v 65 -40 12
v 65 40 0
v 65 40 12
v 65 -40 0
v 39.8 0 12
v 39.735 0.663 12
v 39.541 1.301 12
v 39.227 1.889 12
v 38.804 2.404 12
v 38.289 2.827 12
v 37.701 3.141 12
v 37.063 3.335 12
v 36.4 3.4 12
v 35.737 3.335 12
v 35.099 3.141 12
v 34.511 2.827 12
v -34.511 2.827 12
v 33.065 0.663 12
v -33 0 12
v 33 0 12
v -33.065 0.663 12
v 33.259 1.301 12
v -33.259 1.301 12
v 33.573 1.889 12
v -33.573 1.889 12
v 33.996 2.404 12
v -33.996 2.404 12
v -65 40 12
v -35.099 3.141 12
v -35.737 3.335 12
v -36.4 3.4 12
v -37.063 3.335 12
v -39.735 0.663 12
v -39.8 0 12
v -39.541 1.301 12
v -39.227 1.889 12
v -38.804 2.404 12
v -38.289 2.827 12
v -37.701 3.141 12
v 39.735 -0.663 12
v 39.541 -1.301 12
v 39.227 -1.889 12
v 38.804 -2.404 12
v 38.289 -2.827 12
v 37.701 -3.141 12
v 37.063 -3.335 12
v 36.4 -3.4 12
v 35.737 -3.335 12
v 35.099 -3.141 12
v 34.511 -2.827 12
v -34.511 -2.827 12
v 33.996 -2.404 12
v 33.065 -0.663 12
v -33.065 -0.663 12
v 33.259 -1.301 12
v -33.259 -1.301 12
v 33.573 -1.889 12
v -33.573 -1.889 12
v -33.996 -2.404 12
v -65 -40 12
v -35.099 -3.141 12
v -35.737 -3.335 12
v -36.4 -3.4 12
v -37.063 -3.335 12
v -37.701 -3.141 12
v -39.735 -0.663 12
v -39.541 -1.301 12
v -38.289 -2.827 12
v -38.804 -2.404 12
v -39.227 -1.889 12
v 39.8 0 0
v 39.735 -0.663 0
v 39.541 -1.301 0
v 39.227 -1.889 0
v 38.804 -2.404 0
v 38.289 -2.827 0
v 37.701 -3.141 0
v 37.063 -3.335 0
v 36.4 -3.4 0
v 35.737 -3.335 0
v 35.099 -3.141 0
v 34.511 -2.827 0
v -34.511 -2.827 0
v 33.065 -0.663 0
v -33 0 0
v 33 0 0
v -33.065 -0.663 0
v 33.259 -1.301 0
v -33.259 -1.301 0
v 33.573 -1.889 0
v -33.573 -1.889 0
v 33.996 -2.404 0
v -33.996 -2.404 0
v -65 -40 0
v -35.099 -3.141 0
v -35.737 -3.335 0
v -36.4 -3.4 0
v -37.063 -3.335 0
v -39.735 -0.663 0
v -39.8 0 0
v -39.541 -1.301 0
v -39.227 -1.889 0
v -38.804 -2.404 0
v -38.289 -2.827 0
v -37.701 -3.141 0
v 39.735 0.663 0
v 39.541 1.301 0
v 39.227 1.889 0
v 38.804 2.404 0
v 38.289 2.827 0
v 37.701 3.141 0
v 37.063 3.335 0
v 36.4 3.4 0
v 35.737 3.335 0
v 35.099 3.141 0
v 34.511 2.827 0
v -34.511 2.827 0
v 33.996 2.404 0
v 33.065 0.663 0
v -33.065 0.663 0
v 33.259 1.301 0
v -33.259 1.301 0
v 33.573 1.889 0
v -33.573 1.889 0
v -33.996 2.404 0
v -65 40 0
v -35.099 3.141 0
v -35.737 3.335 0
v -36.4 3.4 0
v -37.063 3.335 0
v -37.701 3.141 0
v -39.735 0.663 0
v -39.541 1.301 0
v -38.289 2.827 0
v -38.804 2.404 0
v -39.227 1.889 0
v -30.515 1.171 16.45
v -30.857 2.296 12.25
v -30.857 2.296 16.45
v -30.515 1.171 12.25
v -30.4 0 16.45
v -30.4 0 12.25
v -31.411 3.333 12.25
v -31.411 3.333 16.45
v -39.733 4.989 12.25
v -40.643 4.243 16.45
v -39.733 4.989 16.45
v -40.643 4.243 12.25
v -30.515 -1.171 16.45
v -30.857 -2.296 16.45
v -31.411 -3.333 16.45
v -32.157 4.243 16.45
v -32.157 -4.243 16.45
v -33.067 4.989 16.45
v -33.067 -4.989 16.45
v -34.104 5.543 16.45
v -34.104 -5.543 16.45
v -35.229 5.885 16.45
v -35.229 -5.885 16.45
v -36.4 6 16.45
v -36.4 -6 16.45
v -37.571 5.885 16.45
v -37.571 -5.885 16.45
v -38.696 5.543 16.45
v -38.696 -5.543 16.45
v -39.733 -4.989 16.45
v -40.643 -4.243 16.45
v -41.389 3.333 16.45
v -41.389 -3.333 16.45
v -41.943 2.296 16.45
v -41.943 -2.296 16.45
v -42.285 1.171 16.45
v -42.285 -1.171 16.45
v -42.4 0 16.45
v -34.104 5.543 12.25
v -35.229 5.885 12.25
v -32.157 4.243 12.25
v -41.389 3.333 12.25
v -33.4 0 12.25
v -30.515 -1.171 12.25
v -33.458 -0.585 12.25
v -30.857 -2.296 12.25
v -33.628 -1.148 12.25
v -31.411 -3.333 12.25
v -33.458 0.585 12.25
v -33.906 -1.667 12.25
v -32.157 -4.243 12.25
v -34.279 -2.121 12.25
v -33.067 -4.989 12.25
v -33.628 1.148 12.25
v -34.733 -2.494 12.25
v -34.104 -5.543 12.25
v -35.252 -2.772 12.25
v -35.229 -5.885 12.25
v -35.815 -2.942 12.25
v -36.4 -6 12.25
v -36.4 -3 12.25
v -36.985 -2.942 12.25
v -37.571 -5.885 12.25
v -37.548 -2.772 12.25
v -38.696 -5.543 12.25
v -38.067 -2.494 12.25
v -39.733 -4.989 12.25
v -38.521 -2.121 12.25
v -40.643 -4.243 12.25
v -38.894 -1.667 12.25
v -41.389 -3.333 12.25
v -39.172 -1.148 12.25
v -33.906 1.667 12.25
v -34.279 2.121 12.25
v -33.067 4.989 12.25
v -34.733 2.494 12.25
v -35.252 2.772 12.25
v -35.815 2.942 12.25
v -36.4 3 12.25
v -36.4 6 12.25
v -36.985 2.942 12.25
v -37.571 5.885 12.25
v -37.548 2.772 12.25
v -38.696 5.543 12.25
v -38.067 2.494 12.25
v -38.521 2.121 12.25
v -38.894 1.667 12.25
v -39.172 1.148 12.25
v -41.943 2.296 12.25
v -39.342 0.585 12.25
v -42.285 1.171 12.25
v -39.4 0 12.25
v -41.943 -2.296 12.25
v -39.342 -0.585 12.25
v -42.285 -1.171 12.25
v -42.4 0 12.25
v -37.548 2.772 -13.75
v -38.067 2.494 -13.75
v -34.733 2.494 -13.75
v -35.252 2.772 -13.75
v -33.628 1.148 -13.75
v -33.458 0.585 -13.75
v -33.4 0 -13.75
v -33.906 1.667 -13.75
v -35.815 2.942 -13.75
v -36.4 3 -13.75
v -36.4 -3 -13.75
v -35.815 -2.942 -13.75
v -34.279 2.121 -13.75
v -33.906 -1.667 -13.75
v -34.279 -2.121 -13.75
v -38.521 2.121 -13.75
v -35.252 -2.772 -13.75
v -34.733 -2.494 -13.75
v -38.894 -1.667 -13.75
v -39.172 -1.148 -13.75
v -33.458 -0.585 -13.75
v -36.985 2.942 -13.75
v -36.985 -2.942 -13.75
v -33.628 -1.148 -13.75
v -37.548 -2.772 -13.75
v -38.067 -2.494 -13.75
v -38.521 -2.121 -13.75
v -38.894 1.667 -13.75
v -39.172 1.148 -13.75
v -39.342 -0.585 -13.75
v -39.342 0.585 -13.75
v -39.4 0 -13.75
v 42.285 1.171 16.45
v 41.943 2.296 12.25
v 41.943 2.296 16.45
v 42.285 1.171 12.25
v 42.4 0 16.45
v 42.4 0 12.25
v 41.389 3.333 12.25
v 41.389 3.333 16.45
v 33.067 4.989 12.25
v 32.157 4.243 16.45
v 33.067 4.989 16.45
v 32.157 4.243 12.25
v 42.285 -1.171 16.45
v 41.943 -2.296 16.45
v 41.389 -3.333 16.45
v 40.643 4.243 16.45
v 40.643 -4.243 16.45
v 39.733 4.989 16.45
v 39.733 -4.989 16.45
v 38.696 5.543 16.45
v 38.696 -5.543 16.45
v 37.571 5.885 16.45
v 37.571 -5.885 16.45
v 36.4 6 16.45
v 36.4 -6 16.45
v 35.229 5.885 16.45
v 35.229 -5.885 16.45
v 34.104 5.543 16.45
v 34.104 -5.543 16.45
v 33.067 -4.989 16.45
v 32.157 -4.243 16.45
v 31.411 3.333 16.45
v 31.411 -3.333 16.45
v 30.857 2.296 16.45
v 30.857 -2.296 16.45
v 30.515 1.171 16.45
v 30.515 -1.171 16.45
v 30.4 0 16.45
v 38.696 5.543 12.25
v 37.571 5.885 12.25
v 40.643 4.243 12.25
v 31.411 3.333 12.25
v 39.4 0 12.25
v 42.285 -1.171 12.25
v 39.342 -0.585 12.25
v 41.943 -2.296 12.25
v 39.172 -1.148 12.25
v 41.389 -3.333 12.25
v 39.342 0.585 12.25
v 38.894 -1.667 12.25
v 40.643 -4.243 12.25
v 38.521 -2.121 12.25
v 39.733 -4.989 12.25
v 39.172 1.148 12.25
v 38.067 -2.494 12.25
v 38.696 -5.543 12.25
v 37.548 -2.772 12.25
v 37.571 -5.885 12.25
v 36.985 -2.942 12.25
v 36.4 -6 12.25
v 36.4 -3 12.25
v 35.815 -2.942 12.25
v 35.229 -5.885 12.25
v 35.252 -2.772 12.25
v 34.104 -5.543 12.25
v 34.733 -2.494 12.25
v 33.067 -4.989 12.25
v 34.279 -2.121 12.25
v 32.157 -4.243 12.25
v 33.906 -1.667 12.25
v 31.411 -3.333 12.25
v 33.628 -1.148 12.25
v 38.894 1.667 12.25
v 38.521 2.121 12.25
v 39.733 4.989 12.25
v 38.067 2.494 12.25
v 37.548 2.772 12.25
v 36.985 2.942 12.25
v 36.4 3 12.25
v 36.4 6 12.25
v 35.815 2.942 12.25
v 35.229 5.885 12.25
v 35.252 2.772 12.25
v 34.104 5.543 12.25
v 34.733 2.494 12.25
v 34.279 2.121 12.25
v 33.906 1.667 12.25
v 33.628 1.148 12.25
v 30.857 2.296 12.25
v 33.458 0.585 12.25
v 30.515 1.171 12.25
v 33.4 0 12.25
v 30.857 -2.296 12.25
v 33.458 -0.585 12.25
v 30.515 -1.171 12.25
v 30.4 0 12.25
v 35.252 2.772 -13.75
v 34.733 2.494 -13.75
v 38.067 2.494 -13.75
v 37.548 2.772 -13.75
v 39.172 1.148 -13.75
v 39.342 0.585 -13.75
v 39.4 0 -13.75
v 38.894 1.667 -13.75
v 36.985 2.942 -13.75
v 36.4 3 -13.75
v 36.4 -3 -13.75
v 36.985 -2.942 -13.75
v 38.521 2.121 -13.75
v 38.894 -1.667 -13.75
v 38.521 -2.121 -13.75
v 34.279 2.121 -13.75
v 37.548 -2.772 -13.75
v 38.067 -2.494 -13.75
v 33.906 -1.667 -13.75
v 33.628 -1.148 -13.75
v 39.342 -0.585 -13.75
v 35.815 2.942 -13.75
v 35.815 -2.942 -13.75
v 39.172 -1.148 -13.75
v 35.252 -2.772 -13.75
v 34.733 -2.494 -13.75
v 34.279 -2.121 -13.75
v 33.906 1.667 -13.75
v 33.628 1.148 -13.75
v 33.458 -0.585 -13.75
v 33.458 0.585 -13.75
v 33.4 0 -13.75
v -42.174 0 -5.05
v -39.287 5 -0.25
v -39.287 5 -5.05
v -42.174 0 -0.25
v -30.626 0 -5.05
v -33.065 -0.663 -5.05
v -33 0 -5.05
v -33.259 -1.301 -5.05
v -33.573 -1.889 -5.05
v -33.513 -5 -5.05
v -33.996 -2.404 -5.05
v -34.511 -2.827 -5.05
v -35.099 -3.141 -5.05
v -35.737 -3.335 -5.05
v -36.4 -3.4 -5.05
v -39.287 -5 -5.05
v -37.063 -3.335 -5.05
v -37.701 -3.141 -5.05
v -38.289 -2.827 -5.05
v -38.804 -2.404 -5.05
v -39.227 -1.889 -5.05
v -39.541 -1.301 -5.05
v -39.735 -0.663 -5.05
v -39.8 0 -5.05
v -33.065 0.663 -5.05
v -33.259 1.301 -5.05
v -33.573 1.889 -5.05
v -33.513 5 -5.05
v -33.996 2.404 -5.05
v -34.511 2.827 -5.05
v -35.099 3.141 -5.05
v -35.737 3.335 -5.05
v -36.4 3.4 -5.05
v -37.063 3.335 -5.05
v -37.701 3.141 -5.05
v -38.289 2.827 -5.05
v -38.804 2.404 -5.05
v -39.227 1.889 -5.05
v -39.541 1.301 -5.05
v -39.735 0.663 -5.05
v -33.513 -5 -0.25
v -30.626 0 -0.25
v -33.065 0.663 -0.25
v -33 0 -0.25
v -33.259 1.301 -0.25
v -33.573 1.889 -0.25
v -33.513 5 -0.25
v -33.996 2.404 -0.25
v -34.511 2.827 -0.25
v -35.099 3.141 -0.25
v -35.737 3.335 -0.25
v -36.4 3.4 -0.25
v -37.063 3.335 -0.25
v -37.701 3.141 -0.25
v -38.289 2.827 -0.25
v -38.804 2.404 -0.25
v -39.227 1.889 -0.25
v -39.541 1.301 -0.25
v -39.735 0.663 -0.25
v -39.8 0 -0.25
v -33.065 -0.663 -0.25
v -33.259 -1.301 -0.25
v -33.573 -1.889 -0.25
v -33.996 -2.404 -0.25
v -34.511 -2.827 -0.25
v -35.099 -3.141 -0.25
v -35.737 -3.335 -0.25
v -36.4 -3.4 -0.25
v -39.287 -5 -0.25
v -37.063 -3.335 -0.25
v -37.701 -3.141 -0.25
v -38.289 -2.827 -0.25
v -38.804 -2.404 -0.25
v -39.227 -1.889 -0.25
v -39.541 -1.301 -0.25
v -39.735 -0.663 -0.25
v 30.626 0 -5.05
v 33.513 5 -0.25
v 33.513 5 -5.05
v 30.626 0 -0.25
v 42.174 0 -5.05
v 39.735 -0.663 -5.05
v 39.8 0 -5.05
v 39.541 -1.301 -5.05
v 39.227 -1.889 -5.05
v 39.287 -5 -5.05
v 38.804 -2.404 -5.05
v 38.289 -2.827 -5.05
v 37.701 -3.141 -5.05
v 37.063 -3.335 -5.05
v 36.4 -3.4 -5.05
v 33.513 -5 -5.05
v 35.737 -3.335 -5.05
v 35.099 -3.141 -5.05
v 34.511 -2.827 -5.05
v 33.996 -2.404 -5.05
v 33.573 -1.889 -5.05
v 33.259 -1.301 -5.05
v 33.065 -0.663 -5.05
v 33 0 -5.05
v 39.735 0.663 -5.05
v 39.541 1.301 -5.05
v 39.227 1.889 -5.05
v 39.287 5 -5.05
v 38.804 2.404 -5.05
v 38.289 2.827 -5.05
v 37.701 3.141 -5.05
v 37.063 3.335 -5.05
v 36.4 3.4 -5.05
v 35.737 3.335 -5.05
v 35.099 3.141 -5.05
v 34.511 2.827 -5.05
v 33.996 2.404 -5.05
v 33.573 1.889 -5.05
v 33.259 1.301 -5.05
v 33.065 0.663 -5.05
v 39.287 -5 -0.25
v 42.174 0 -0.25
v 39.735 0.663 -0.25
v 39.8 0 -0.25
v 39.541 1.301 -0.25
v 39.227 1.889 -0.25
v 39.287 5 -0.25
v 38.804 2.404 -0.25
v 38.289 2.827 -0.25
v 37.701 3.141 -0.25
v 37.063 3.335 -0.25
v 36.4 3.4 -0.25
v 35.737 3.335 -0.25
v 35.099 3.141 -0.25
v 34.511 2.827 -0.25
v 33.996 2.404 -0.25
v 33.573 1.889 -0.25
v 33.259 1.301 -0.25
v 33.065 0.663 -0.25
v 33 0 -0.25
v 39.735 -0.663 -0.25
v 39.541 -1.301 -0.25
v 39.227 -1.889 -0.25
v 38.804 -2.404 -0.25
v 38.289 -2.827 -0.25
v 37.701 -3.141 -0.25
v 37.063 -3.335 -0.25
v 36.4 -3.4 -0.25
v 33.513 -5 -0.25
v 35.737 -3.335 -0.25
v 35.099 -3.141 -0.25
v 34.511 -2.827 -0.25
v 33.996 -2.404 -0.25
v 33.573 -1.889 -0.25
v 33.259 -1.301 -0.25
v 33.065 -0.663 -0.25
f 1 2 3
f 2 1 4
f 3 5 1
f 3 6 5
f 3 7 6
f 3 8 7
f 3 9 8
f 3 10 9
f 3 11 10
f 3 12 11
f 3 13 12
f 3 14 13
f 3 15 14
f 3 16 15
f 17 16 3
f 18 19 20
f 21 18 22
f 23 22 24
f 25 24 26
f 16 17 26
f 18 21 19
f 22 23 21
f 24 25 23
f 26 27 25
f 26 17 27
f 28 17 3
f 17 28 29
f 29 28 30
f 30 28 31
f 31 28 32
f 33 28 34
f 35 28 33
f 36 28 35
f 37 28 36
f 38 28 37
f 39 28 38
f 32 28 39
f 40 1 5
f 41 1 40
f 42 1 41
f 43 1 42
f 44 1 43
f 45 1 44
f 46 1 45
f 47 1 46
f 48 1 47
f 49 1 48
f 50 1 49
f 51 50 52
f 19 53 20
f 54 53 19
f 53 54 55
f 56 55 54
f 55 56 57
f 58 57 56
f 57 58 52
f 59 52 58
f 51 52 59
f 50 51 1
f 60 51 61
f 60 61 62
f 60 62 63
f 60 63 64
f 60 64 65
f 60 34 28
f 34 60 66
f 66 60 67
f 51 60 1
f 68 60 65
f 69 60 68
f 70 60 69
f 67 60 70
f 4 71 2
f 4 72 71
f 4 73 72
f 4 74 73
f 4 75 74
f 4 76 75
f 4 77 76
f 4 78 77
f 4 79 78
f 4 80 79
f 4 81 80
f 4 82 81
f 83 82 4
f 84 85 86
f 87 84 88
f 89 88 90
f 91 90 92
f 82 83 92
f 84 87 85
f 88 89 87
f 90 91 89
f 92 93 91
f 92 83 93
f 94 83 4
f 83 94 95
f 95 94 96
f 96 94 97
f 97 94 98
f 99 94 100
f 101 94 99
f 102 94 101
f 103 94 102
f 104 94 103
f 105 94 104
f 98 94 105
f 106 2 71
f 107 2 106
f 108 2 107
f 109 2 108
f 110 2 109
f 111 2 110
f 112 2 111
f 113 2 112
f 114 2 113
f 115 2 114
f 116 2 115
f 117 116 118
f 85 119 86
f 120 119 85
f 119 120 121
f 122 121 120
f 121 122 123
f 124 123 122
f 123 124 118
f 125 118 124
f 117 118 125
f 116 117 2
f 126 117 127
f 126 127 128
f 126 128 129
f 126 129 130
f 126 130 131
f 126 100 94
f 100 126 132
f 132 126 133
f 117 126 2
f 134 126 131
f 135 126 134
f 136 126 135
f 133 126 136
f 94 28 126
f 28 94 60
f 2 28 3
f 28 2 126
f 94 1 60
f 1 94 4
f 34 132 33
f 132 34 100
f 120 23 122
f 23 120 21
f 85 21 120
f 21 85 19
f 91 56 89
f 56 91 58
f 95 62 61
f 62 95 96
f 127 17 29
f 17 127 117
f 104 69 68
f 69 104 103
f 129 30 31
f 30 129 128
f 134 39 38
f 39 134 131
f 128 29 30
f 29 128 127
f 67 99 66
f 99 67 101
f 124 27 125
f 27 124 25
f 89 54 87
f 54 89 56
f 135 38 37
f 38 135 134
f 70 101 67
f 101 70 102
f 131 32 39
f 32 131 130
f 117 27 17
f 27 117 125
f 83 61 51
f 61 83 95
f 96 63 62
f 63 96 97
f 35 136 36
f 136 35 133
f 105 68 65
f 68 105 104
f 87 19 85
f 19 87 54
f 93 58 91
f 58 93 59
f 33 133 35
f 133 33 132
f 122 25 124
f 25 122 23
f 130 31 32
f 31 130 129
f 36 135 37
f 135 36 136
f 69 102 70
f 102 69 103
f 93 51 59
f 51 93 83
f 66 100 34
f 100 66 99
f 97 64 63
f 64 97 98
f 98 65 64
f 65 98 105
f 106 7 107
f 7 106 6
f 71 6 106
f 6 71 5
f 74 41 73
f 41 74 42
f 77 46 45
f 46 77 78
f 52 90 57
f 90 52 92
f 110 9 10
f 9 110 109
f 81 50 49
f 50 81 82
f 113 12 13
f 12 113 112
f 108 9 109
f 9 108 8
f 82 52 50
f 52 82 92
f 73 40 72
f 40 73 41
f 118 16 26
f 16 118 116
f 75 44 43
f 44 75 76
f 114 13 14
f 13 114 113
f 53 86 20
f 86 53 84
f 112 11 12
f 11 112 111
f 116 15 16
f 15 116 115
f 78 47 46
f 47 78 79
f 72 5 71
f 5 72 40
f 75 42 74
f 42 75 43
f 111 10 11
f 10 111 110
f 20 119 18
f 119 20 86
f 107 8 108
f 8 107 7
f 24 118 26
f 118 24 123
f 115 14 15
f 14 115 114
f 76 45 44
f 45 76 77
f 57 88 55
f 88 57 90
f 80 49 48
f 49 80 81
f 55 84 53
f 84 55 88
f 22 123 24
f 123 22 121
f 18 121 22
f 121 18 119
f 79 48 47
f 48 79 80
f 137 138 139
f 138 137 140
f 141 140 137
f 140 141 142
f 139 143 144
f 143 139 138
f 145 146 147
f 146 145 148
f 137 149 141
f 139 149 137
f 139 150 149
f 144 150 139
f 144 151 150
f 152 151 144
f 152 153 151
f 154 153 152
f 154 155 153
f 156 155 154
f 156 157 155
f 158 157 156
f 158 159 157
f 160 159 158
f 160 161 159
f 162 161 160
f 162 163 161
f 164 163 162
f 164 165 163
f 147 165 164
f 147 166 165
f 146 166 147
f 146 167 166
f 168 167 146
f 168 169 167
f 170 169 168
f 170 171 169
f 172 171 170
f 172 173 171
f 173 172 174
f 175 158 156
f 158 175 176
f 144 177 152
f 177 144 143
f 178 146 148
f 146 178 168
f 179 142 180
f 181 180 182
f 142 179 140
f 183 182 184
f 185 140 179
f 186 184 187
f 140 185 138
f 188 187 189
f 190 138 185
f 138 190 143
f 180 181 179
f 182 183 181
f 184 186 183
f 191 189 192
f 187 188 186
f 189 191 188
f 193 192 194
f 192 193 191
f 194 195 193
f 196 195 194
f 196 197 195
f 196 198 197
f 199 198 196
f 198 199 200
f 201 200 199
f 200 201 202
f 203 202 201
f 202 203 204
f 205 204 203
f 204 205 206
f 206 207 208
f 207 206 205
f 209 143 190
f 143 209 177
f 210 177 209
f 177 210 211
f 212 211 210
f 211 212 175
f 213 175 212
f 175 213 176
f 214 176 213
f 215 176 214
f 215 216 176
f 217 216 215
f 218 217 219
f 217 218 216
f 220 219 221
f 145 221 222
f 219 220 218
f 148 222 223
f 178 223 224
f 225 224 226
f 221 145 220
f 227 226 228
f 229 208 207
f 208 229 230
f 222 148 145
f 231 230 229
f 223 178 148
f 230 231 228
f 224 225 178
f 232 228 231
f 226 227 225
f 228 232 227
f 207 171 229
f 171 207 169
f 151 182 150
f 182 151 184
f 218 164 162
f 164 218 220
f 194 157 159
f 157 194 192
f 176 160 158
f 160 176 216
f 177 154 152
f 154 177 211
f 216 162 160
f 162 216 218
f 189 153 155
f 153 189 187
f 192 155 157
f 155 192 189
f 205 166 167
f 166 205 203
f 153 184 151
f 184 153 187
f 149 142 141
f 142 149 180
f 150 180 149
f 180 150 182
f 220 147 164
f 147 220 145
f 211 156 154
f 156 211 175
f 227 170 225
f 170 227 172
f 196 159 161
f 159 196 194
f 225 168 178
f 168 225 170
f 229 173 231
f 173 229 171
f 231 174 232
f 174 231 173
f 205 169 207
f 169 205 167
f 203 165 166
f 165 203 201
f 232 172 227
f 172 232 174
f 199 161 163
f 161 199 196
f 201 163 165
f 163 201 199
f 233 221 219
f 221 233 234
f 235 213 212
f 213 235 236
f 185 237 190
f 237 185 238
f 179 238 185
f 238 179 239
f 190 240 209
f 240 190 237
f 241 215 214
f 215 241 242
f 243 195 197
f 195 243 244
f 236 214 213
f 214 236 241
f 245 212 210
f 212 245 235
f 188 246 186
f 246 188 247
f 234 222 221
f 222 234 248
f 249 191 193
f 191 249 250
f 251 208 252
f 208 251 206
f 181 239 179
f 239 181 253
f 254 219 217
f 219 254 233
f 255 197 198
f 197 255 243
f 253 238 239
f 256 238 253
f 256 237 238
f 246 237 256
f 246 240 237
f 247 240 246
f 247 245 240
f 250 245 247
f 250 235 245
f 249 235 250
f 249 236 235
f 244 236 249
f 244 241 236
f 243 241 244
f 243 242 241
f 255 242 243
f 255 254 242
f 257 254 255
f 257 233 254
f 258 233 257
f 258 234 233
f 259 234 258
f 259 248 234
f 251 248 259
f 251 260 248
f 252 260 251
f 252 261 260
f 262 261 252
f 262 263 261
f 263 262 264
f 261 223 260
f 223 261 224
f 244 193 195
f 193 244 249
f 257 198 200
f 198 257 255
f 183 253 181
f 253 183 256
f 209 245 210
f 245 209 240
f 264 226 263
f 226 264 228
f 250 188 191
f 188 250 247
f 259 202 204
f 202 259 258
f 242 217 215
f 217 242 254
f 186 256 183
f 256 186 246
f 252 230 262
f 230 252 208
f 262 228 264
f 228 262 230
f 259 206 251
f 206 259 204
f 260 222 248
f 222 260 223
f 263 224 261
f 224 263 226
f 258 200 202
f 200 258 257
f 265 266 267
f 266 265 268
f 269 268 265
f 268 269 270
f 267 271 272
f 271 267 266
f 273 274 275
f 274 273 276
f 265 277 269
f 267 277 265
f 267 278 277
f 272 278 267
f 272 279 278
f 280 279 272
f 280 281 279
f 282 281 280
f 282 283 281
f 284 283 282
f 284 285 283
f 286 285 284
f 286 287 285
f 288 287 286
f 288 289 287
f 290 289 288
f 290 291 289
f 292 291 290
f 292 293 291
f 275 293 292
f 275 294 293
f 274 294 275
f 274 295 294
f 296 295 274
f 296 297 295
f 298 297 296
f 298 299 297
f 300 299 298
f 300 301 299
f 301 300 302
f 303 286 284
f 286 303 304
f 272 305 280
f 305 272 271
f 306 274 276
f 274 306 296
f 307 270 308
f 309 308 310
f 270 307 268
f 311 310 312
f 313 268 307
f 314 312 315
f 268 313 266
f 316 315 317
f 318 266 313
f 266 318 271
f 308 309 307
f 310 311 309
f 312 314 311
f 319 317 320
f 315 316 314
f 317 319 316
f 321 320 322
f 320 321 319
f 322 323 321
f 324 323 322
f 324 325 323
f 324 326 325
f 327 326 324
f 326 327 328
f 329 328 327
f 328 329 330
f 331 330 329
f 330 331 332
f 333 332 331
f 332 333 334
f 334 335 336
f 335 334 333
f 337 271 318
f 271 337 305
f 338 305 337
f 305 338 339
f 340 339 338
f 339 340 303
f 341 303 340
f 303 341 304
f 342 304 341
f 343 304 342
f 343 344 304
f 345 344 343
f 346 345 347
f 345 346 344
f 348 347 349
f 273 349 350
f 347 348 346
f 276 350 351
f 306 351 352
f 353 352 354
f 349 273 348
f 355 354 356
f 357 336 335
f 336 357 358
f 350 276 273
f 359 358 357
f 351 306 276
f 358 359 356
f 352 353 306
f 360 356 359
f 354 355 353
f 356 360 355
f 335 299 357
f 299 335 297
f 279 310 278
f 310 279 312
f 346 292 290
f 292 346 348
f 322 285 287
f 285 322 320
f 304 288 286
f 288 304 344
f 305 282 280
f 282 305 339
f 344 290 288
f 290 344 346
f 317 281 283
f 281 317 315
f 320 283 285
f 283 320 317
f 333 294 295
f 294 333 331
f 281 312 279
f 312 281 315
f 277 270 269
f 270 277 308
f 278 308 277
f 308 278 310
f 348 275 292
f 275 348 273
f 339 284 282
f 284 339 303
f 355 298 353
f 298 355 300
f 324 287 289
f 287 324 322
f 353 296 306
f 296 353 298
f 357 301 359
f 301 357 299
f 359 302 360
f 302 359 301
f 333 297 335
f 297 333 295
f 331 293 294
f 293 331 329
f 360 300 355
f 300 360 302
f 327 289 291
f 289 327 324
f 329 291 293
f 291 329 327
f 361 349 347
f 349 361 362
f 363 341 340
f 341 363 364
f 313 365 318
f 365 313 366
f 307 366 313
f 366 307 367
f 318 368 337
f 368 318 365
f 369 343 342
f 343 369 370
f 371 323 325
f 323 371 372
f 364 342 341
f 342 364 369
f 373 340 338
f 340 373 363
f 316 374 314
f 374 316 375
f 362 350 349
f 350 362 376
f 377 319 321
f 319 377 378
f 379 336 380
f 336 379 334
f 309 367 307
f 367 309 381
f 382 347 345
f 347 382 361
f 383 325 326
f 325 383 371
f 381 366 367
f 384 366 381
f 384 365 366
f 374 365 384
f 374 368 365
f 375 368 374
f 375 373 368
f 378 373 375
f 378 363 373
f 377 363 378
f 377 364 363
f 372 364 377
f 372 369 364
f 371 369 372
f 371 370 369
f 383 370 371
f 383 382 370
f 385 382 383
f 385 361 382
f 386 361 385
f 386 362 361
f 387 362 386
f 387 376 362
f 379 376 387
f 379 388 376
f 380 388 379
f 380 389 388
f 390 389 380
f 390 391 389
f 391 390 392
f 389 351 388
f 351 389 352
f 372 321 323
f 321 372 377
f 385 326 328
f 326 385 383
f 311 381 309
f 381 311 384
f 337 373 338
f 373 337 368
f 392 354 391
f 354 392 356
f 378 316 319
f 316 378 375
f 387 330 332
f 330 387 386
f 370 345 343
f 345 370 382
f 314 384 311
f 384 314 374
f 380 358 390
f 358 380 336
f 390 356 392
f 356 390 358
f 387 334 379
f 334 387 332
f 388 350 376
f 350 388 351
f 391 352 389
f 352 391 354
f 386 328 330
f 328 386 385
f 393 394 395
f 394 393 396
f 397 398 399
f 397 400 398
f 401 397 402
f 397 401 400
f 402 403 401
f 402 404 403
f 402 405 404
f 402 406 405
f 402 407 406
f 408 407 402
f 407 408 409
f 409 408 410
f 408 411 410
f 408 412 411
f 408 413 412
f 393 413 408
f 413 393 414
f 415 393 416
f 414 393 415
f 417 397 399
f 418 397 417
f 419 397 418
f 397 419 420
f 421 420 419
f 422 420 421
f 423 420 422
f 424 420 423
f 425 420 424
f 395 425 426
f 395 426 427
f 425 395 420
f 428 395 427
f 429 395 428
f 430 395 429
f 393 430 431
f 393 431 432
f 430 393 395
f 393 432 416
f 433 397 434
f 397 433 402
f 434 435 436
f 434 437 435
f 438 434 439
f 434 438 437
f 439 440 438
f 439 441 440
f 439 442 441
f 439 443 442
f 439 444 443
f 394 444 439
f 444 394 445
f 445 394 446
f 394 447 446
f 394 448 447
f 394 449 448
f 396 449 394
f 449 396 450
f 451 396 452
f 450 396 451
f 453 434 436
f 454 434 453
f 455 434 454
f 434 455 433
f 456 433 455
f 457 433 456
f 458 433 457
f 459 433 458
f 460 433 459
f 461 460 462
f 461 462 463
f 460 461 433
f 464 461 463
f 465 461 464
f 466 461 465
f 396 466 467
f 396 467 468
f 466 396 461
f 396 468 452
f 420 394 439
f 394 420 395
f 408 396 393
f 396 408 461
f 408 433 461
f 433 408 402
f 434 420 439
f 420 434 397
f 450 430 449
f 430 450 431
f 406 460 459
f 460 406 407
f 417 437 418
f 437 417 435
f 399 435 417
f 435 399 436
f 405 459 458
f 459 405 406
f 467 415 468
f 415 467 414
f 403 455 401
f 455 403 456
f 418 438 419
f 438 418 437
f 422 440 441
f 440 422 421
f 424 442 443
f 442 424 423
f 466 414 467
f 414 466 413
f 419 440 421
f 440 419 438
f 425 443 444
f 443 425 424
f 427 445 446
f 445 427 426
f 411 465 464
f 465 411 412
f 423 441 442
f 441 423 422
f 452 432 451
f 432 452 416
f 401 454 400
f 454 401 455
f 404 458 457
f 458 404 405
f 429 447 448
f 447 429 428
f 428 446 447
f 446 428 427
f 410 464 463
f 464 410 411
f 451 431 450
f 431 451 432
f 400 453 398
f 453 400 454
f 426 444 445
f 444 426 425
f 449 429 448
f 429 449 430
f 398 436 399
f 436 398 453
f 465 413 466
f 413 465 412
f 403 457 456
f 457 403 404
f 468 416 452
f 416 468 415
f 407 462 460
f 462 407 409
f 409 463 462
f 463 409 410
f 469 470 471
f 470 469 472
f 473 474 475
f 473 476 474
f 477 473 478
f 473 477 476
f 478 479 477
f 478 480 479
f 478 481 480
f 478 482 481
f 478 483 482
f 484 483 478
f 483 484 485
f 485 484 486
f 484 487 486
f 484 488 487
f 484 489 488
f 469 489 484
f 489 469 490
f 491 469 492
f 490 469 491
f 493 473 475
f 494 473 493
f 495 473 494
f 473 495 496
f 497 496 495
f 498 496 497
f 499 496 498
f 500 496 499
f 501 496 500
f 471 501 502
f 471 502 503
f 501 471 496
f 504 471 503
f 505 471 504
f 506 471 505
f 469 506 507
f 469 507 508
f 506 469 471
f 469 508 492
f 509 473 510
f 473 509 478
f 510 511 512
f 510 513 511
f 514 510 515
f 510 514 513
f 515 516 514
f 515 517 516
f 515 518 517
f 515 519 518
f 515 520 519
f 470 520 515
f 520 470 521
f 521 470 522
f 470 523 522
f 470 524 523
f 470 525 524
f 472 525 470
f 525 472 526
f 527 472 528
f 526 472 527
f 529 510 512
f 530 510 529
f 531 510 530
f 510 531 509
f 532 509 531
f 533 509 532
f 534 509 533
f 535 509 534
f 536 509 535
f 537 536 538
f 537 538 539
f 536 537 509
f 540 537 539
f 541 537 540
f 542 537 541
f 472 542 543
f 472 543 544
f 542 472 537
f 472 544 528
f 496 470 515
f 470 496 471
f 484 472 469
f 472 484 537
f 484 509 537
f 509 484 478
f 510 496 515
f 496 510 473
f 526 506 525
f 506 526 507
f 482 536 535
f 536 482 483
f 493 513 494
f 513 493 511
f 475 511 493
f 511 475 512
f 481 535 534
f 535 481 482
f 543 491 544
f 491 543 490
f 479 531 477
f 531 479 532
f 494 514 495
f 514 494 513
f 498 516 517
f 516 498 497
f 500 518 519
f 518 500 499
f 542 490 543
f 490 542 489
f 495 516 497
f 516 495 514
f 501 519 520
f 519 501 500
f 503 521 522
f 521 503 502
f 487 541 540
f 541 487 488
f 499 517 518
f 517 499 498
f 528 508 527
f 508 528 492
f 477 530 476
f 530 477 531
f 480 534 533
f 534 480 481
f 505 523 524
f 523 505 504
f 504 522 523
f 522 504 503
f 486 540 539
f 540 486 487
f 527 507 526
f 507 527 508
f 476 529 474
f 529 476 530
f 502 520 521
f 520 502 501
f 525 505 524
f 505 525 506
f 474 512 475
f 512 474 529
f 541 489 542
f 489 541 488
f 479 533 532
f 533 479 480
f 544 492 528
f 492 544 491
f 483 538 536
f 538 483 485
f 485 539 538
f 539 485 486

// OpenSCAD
$fn = 32;

// ------------------------------------------------------------------------
// Bolted plate: 130 x 80 x 12 mm plate, 2 fasteners
// Every part is its own module, assembly() places them once.
// ------------------------------------------------------------------------

// --- part 1 ---
module plate() {
  difference() {
    translate([-65, -40, 0]) cube([130, 80, 12]);
    translate([-36.4, 0, -1]) cylinder(h = 14, d = 6.8);
    translate([36.4, 0, -1]) cylinder(h = 14, d = 6.8);
  }
}

// --- part 2 ---
module bolt1() {
  cylinder(h = 4.2, d = 12);
  translate([0, 0, -26]) cylinder(h = 26, d = 6);
}

// --- part 3 ---
module bolt2() {
  cylinder(h = 4.2, d = 12);
  translate([0, 0, -26]) cylinder(h = 26, d = 6);
}

// --- part 4 ---
module nut1() {
  difference() {
    linear_extrude(height = 4.8) polygon(points = [[5.774, 0], [2.887, 5], [-2.887, 5], [-5.774, 0], [-2.887, -5], [2.887, -5]]);
    translate([0, 0, -1]) cylinder(h = 6.8, d = 6.8);
  }
}

// --- part 5 ---
module nut2() {
  difference() {
    linear_extrude(height = 4.8) polygon(points = [[5.774, 0], [2.887, 5], [-2.887, 5], [-5.774, 0], [-2.887, -5], [2.887, -5]]);
    translate([0, 0, -1]) cylinder(h = 6.8, d = 6.8);
  }
}

// --- assembly ---
module assembly() {
  translate([0, 0, 0]) rotate([0, 0, 0]) plate();
  translate([-36.4, 0, 12.25]) rotate([0, 0, 0]) bolt1();
  translate([36.4, 0, 12.25]) rotate([0, 0, 0]) bolt2();
  translate([-36.4, 0, -5.05]) rotate([0, 0, 0]) nut1();
  translate([36.4, 0, -5.05]) rotate([0, 0, 0]) nut2();
}

assembly();
